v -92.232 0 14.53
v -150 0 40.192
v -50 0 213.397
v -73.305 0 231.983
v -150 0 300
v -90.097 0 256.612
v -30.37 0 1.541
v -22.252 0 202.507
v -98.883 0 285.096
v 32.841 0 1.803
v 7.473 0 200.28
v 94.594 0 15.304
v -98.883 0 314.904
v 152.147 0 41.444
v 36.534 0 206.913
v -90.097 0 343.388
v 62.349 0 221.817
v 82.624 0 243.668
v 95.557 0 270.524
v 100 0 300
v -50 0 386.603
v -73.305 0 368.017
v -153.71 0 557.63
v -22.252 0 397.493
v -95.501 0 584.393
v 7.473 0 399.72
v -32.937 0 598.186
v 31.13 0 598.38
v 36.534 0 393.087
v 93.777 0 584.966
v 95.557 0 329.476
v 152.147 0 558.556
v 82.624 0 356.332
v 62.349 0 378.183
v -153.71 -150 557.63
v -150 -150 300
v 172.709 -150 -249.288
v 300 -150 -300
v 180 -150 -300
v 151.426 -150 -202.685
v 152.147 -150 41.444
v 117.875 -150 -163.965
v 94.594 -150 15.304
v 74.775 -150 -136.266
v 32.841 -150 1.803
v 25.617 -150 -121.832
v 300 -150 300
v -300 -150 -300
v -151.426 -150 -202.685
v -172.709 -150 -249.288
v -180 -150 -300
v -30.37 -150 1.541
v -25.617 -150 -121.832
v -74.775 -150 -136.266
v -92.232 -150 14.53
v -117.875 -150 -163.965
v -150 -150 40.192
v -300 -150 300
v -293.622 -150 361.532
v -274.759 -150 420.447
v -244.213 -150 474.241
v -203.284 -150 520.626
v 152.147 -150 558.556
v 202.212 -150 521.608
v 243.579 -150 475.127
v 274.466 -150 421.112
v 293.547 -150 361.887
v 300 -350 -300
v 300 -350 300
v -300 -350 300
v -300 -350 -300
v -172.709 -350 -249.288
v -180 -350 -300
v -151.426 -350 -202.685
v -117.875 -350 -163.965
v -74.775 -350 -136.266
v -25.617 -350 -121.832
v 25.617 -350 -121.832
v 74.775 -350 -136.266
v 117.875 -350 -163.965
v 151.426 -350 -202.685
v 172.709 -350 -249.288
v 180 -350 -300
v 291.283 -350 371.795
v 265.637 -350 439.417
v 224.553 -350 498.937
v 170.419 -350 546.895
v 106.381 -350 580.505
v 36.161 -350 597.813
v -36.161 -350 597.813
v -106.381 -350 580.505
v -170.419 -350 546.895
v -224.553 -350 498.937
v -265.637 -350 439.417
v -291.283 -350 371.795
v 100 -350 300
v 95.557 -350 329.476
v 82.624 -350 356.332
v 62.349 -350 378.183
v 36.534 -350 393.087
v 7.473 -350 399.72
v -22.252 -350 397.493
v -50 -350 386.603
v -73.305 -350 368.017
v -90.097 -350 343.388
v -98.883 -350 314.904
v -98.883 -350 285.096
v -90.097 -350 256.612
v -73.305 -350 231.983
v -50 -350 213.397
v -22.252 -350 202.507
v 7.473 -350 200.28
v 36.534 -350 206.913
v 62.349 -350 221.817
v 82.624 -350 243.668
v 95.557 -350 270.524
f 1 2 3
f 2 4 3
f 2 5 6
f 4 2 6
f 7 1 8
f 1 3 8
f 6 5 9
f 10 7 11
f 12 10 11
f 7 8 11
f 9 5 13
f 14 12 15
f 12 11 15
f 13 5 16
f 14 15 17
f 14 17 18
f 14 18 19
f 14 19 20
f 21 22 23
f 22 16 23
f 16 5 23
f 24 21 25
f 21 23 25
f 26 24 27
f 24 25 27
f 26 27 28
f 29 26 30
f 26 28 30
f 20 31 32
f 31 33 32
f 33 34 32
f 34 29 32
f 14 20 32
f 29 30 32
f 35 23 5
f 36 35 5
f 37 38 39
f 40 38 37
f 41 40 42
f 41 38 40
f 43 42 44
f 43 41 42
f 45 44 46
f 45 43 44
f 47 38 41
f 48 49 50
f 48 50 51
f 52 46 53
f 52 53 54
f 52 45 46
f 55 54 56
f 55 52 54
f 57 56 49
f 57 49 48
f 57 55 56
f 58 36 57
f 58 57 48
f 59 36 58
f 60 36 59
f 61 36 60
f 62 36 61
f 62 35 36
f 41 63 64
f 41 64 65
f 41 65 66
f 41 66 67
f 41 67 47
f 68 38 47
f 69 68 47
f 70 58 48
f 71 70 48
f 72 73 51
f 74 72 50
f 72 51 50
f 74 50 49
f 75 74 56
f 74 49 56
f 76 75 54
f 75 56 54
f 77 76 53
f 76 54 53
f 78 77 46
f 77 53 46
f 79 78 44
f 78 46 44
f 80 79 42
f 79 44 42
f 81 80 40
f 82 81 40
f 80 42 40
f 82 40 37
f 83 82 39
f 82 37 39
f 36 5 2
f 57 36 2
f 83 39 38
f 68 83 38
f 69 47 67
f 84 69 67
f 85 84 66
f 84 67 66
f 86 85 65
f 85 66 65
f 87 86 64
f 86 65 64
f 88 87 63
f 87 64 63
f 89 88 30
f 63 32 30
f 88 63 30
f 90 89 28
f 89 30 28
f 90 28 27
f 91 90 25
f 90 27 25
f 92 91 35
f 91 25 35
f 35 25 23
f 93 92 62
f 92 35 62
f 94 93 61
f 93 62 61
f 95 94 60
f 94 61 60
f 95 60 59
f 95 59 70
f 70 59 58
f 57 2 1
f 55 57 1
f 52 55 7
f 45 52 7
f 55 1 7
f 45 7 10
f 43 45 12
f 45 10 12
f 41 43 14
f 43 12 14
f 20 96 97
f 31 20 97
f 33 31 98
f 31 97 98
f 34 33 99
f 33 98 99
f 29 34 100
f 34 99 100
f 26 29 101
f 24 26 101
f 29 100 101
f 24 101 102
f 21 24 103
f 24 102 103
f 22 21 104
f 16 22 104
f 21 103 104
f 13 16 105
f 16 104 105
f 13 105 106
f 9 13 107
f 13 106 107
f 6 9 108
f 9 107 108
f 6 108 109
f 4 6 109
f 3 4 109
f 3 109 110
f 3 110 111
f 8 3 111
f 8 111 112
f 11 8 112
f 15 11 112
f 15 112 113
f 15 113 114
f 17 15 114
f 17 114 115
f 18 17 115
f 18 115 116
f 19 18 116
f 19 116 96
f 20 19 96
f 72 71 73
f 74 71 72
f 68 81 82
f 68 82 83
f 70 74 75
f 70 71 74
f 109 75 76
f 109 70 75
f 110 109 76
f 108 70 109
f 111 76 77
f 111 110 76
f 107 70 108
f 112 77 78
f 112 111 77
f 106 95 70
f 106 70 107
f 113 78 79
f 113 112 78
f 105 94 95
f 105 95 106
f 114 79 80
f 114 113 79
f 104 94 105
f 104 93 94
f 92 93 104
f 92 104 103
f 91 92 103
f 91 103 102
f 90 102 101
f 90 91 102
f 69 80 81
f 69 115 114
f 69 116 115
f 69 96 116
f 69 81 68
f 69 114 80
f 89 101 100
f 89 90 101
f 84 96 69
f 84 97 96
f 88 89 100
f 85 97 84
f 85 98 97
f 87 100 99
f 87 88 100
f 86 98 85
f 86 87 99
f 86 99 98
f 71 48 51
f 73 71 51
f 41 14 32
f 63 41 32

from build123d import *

# Parameters (mm, degrees)
F2_DEPTH = 350
F3_DEPTH = 25
F4_R     = 100
F5_DEPTH = 350.001
F7_DEPTH = 150


with BuildPart() as f2:
    # F0 (on Front) → F2 (new body)
    with BuildSketch(Plane.XZ):
        with BuildLine():
            Line((300, -300), (300, 300))
            Line((300, 300), (-300, 300))
            Line((-300, 300), (-300, -300))
            Line((-300, -300), (-180, -300))
            ThreePointArc((-180, -300), (0, -120), (180, -300))
            Line((180, -300), (300, -300))
        make_face()
        with BuildLine():
            Line((-300, 300), (300, 300))
            ThreePointArc((300, 300), (0, 600), (-300, 300))
        make_face()
    extrude(amount=F2_DEPTH)

    # F1 (on face) → F3 (cut)
    with BuildSketch(Plane.XZ):
        with BuildLine():
            ThreePointArc((180, -300), (0, -120), (-180, -300))
            Line((-180, -300), (180, -300))
        make_face()
    extrude(amount=-F3_DEPTH, mode=Mode.SUBTRACT)

    # F4 (on face) → F5 (cut, through all)
    with BuildSketch(Plane.XZ.offset(350)):
        with Locations((0, 300)):
            Circle(F4_R)
    extrude(amount=-F5_DEPTH, mode=Mode.SUBTRACT)

    # F6 (on face) → F7 (cut)
    with BuildSketch(Plane(origin=(0, 0, 0), x_dir=(-1, 0, 0), z_dir=(0, 1, 0))):
        with BuildLine():
            ThreePointArc((150, 40.192379), (-1.242634, 0.002574), (-152.147139, 41.443917))
            Line((-152.147139, 41.443917), (-152.147139, 558.556083))
            ThreePointArc((-152.147139, 558.556083), (-260.426709, 448.922561), (-300, 300))
            Line((-300, 300), (-300, -300))
            Line((-300, -300), (-180, -300))
            ThreePointArc((-180, -300), (0, -120), (180, -300))
            Line((180, -300), (300, -300))
            Line((300, -300), (300, 300))
            ThreePointArc((300, 300), (260.876453, 448.133306), (153.710157, 557.629943))
            Line((153.710157, 557.629943), (150, 300))
            Line((150, 300), (150, 40.192379))
        make_face()
    extrude(amount=-F7_DEPTH, mode=Mode.SUBTRACT)


solid = f2.part
